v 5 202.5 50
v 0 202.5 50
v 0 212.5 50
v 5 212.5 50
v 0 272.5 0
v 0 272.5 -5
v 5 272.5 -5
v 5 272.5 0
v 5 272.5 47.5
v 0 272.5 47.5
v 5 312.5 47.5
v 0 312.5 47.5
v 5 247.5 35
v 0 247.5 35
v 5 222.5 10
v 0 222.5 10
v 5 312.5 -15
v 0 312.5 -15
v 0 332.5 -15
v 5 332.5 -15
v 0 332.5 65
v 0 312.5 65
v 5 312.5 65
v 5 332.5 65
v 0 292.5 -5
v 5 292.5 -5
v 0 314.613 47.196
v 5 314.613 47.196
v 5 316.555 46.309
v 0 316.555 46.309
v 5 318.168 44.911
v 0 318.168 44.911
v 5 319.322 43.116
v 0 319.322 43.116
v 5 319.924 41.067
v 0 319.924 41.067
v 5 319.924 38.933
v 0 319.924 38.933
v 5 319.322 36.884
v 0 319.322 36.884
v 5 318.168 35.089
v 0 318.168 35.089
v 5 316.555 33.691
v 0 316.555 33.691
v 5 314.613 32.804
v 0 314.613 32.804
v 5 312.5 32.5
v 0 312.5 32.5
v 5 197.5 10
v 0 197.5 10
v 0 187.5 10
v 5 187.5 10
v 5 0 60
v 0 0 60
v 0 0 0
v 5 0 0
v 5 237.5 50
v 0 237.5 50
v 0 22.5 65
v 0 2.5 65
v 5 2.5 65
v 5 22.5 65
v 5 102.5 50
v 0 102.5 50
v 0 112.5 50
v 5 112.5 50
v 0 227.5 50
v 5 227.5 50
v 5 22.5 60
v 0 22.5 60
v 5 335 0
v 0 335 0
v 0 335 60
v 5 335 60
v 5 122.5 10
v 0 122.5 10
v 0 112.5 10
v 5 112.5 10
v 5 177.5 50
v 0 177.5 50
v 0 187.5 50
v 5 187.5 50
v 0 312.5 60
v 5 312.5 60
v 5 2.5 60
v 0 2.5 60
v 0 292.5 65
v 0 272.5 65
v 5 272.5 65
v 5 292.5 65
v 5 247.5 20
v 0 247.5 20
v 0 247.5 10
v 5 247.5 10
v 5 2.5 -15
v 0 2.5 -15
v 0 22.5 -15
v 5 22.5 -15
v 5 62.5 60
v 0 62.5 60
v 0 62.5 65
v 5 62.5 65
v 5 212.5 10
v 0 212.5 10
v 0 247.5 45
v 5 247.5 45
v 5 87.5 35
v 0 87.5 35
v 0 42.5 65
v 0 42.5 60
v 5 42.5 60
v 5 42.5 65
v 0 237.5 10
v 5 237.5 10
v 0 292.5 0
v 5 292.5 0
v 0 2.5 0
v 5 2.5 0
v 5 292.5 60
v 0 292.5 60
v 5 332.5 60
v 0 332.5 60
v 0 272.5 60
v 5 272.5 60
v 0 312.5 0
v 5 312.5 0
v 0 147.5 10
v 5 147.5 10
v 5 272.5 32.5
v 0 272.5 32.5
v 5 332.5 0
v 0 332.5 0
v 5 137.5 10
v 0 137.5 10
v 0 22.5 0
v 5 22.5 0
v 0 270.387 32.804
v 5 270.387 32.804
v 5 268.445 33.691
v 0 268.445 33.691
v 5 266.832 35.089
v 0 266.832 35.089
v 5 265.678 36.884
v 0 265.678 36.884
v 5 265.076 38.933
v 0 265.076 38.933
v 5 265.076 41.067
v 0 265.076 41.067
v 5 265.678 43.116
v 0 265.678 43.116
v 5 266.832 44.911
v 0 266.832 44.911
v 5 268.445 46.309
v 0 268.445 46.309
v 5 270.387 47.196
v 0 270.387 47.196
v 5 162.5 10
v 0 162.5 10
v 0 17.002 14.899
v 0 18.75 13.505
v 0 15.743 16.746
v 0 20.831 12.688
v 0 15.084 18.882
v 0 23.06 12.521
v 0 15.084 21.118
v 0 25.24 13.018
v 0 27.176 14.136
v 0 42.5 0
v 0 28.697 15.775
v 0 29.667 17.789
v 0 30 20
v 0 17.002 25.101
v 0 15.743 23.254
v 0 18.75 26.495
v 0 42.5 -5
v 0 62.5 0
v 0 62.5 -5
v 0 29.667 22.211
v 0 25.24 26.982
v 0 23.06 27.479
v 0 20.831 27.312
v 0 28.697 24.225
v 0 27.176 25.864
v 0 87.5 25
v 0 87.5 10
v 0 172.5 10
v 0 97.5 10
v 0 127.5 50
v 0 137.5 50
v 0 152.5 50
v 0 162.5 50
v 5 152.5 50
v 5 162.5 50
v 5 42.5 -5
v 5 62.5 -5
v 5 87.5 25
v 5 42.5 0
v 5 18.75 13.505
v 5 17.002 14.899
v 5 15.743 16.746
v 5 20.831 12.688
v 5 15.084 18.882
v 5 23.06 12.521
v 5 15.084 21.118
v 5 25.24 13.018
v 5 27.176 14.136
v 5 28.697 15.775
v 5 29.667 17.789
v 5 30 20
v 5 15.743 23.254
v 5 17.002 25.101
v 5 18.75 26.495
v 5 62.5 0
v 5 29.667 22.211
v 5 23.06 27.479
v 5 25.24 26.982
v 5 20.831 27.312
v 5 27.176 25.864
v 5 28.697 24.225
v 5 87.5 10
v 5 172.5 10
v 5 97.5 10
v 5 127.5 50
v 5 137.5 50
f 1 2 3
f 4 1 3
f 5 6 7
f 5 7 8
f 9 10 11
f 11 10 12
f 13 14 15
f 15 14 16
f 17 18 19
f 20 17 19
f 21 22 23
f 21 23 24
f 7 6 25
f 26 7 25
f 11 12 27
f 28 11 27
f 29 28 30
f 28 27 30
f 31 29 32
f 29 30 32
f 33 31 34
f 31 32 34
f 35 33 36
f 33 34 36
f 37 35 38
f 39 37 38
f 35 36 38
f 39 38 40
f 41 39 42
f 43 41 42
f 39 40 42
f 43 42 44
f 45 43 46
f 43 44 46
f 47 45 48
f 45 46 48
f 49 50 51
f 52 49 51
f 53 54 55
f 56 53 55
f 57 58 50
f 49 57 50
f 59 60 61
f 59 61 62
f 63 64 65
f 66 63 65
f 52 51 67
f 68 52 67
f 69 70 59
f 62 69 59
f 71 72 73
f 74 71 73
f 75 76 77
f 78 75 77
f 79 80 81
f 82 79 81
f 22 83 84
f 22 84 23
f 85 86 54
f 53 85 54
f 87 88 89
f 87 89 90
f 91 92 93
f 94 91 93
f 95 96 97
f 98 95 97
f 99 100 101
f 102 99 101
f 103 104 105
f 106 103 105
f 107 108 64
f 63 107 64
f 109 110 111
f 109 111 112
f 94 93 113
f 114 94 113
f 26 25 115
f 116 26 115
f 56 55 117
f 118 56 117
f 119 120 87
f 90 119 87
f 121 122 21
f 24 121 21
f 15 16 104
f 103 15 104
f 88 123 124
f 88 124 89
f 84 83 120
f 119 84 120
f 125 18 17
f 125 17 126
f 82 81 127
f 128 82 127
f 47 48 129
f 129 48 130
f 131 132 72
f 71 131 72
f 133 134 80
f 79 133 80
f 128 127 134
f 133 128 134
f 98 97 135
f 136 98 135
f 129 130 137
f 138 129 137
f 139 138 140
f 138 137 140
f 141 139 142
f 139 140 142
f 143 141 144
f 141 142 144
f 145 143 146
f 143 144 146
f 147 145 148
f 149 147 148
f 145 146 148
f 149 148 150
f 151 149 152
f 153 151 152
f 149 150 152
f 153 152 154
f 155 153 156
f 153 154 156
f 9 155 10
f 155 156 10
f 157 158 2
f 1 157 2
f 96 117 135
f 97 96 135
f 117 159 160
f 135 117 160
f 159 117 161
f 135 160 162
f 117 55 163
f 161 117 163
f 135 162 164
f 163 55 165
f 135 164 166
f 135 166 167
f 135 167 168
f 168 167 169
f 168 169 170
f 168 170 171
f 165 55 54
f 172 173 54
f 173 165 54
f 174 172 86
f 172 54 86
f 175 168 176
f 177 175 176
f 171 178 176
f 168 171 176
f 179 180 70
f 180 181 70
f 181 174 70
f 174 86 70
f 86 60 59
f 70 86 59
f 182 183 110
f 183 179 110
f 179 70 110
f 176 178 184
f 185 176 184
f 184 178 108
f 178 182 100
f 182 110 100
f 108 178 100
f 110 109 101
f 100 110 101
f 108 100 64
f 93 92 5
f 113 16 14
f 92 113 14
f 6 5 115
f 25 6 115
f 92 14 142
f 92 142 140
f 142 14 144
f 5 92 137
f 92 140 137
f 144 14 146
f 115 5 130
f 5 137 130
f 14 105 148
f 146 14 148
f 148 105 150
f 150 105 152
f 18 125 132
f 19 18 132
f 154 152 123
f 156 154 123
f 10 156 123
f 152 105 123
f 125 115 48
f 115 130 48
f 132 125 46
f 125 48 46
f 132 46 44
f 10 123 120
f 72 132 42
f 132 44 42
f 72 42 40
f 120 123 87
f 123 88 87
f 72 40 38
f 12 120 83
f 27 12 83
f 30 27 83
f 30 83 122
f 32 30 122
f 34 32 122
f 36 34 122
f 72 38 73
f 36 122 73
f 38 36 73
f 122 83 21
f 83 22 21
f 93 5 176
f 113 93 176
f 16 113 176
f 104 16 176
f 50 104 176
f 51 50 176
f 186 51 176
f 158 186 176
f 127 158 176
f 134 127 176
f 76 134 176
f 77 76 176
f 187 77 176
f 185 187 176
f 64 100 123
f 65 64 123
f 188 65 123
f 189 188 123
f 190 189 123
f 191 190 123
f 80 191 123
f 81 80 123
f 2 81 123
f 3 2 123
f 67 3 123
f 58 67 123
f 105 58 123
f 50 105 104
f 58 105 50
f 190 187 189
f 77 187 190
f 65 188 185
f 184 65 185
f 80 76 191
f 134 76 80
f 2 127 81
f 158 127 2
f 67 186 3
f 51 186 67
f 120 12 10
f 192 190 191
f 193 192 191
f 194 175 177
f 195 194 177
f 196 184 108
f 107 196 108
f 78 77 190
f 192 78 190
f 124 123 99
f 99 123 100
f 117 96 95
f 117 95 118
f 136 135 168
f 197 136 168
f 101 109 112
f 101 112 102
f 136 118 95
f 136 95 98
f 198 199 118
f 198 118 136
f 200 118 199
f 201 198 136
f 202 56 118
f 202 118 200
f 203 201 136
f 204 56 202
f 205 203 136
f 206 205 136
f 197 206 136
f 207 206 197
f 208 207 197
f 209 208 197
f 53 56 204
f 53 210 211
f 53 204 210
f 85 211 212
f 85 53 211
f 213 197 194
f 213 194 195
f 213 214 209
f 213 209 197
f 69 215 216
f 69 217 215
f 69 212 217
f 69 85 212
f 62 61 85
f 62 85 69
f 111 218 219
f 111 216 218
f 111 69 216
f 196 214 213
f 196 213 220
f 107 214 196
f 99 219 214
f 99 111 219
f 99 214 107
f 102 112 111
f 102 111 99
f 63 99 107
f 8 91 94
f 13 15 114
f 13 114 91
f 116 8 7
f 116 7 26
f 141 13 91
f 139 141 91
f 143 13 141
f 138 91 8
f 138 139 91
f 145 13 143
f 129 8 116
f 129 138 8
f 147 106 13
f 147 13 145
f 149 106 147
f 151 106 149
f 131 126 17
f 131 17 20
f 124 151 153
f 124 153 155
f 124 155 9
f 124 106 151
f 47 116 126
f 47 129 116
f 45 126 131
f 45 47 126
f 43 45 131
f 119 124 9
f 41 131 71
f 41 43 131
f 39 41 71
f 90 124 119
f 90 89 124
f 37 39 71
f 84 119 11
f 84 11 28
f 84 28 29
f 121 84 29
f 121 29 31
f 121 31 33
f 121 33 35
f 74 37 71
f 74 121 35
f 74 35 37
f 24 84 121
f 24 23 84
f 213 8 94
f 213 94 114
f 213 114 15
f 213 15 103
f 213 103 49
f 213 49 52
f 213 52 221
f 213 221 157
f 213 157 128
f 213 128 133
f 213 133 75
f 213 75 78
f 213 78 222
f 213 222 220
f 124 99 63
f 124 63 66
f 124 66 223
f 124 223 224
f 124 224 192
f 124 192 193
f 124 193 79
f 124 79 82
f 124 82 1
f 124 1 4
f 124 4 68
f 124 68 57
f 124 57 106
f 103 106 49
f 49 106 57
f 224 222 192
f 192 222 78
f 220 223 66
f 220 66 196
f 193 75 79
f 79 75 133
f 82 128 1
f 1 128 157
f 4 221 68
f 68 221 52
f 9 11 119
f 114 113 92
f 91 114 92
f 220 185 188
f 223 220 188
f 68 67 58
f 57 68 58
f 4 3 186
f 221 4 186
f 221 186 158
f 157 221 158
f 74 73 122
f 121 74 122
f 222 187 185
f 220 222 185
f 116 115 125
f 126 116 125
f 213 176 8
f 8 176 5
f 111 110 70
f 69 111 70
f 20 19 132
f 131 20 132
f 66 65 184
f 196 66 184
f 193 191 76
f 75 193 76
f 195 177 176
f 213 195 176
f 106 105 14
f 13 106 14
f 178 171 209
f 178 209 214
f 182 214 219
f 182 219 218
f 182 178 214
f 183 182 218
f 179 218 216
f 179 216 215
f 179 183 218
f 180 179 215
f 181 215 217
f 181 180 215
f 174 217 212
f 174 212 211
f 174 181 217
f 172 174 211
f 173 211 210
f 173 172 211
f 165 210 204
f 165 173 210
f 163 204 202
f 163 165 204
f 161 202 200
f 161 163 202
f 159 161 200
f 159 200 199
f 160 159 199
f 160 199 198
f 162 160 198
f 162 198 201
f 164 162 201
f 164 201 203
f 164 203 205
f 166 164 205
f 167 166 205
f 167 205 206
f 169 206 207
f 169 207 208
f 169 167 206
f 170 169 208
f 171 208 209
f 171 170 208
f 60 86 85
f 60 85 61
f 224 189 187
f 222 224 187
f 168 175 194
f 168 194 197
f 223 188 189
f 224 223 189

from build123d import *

# Parameters (mm, degrees)
F1_R     = 7.5
F1_W     = 20
F1_H     = 15
F1_H_2   = 5
F2_DEPTH = 5


with BuildPart() as f2:
    # F1 (on Right) → F2 (new body)
    with BuildSketch(Plane.YZ):
        Polygon((0, 60), (0, 0), (2.5, 0), (22.5, 0), (42.5, 0), (62.5, 0), (272.5, 0), (292.5, 0), (312.5, 0), (332.5, 0), (335, 0), (335, 60), (332.5, 60), (312.5, 60), (292.5, 60), (272.5, 60), (62.5, 60), (42.5, 60), (22.5, 60), (2.5, 60), align=None)
        with Locations((22.5, 20)):
            Circle(F1_R, mode=Mode.SUBTRACT)
        Polygon((247.5, 10), (237.5, 10), (247.5, 20), align=None, mode=Mode.SUBTRACT)
        Polygon((97.5, 10), (87.5, 10), (127.5, 50), (137.5, 50), align=None, mode=Mode.SUBTRACT)
        Polygon((122.5, 10), (112.5, 10), (152.5, 50), (162.5, 50), align=None, mode=Mode.SUBTRACT)
        Polygon((147.5, 10), (137.5, 10), (177.5, 50), (187.5, 50), align=None, mode=Mode.SUBTRACT)
        Polygon((102.5, 50), (112.5, 50), (87.5, 25), (87.5, 35), align=None, mode=Mode.SUBTRACT)
        Polygon((172.5, 10), (162.5, 10), (202.5, 50), (212.5, 50), align=None, mode=Mode.SUBTRACT)
        Polygon((222.5, 10), (212.5, 10), (247.5, 45), (247.5, 35), align=None, mode=Mode.SUBTRACT)
        Polygon((197.5, 10), (187.5, 10), (227.5, 50), (237.5, 50), align=None, mode=Mode.SUBTRACT)
        with BuildLine():
            Line((312.5, 32.5), (272.5, 32.5))
            ThreePointArc((272.5, 32.5), (265, 40), (272.5, 47.5))
            Line((272.5, 47.5), (312.5, 47.5))
            ThreePointArc((312.5, 47.5), (320, 40), (312.5, 32.5))
        make_face(mode=Mode.SUBTRACT)
        with Locations((12.5, -7.5)):
            Rectangle(F1_W, F1_H)
        with Locations((12.5, 62.5)):
            Rectangle(F1_W, F1_H_2)
        with Locations((52.5, -2.5)):
            Rectangle(F1_W, F1_H_2)
        with Locations((52.5, 62.5)):
            Rectangle(F1_W, F1_H_2)
        with Locations((282.5, -2.5)):
            Rectangle(F1_W, F1_H_2)
        with Locations((282.5, 62.5)):
            Rectangle(F1_W, F1_H_2)
        with Locations((322.5, -7.5)):
            Rectangle(F1_W, F1_H)
        with Locations((322.5, 62.5)):
            Rectangle(F1_W, F1_H_2)
    extrude(amount=F2_DEPTH)


solid = f2.part
